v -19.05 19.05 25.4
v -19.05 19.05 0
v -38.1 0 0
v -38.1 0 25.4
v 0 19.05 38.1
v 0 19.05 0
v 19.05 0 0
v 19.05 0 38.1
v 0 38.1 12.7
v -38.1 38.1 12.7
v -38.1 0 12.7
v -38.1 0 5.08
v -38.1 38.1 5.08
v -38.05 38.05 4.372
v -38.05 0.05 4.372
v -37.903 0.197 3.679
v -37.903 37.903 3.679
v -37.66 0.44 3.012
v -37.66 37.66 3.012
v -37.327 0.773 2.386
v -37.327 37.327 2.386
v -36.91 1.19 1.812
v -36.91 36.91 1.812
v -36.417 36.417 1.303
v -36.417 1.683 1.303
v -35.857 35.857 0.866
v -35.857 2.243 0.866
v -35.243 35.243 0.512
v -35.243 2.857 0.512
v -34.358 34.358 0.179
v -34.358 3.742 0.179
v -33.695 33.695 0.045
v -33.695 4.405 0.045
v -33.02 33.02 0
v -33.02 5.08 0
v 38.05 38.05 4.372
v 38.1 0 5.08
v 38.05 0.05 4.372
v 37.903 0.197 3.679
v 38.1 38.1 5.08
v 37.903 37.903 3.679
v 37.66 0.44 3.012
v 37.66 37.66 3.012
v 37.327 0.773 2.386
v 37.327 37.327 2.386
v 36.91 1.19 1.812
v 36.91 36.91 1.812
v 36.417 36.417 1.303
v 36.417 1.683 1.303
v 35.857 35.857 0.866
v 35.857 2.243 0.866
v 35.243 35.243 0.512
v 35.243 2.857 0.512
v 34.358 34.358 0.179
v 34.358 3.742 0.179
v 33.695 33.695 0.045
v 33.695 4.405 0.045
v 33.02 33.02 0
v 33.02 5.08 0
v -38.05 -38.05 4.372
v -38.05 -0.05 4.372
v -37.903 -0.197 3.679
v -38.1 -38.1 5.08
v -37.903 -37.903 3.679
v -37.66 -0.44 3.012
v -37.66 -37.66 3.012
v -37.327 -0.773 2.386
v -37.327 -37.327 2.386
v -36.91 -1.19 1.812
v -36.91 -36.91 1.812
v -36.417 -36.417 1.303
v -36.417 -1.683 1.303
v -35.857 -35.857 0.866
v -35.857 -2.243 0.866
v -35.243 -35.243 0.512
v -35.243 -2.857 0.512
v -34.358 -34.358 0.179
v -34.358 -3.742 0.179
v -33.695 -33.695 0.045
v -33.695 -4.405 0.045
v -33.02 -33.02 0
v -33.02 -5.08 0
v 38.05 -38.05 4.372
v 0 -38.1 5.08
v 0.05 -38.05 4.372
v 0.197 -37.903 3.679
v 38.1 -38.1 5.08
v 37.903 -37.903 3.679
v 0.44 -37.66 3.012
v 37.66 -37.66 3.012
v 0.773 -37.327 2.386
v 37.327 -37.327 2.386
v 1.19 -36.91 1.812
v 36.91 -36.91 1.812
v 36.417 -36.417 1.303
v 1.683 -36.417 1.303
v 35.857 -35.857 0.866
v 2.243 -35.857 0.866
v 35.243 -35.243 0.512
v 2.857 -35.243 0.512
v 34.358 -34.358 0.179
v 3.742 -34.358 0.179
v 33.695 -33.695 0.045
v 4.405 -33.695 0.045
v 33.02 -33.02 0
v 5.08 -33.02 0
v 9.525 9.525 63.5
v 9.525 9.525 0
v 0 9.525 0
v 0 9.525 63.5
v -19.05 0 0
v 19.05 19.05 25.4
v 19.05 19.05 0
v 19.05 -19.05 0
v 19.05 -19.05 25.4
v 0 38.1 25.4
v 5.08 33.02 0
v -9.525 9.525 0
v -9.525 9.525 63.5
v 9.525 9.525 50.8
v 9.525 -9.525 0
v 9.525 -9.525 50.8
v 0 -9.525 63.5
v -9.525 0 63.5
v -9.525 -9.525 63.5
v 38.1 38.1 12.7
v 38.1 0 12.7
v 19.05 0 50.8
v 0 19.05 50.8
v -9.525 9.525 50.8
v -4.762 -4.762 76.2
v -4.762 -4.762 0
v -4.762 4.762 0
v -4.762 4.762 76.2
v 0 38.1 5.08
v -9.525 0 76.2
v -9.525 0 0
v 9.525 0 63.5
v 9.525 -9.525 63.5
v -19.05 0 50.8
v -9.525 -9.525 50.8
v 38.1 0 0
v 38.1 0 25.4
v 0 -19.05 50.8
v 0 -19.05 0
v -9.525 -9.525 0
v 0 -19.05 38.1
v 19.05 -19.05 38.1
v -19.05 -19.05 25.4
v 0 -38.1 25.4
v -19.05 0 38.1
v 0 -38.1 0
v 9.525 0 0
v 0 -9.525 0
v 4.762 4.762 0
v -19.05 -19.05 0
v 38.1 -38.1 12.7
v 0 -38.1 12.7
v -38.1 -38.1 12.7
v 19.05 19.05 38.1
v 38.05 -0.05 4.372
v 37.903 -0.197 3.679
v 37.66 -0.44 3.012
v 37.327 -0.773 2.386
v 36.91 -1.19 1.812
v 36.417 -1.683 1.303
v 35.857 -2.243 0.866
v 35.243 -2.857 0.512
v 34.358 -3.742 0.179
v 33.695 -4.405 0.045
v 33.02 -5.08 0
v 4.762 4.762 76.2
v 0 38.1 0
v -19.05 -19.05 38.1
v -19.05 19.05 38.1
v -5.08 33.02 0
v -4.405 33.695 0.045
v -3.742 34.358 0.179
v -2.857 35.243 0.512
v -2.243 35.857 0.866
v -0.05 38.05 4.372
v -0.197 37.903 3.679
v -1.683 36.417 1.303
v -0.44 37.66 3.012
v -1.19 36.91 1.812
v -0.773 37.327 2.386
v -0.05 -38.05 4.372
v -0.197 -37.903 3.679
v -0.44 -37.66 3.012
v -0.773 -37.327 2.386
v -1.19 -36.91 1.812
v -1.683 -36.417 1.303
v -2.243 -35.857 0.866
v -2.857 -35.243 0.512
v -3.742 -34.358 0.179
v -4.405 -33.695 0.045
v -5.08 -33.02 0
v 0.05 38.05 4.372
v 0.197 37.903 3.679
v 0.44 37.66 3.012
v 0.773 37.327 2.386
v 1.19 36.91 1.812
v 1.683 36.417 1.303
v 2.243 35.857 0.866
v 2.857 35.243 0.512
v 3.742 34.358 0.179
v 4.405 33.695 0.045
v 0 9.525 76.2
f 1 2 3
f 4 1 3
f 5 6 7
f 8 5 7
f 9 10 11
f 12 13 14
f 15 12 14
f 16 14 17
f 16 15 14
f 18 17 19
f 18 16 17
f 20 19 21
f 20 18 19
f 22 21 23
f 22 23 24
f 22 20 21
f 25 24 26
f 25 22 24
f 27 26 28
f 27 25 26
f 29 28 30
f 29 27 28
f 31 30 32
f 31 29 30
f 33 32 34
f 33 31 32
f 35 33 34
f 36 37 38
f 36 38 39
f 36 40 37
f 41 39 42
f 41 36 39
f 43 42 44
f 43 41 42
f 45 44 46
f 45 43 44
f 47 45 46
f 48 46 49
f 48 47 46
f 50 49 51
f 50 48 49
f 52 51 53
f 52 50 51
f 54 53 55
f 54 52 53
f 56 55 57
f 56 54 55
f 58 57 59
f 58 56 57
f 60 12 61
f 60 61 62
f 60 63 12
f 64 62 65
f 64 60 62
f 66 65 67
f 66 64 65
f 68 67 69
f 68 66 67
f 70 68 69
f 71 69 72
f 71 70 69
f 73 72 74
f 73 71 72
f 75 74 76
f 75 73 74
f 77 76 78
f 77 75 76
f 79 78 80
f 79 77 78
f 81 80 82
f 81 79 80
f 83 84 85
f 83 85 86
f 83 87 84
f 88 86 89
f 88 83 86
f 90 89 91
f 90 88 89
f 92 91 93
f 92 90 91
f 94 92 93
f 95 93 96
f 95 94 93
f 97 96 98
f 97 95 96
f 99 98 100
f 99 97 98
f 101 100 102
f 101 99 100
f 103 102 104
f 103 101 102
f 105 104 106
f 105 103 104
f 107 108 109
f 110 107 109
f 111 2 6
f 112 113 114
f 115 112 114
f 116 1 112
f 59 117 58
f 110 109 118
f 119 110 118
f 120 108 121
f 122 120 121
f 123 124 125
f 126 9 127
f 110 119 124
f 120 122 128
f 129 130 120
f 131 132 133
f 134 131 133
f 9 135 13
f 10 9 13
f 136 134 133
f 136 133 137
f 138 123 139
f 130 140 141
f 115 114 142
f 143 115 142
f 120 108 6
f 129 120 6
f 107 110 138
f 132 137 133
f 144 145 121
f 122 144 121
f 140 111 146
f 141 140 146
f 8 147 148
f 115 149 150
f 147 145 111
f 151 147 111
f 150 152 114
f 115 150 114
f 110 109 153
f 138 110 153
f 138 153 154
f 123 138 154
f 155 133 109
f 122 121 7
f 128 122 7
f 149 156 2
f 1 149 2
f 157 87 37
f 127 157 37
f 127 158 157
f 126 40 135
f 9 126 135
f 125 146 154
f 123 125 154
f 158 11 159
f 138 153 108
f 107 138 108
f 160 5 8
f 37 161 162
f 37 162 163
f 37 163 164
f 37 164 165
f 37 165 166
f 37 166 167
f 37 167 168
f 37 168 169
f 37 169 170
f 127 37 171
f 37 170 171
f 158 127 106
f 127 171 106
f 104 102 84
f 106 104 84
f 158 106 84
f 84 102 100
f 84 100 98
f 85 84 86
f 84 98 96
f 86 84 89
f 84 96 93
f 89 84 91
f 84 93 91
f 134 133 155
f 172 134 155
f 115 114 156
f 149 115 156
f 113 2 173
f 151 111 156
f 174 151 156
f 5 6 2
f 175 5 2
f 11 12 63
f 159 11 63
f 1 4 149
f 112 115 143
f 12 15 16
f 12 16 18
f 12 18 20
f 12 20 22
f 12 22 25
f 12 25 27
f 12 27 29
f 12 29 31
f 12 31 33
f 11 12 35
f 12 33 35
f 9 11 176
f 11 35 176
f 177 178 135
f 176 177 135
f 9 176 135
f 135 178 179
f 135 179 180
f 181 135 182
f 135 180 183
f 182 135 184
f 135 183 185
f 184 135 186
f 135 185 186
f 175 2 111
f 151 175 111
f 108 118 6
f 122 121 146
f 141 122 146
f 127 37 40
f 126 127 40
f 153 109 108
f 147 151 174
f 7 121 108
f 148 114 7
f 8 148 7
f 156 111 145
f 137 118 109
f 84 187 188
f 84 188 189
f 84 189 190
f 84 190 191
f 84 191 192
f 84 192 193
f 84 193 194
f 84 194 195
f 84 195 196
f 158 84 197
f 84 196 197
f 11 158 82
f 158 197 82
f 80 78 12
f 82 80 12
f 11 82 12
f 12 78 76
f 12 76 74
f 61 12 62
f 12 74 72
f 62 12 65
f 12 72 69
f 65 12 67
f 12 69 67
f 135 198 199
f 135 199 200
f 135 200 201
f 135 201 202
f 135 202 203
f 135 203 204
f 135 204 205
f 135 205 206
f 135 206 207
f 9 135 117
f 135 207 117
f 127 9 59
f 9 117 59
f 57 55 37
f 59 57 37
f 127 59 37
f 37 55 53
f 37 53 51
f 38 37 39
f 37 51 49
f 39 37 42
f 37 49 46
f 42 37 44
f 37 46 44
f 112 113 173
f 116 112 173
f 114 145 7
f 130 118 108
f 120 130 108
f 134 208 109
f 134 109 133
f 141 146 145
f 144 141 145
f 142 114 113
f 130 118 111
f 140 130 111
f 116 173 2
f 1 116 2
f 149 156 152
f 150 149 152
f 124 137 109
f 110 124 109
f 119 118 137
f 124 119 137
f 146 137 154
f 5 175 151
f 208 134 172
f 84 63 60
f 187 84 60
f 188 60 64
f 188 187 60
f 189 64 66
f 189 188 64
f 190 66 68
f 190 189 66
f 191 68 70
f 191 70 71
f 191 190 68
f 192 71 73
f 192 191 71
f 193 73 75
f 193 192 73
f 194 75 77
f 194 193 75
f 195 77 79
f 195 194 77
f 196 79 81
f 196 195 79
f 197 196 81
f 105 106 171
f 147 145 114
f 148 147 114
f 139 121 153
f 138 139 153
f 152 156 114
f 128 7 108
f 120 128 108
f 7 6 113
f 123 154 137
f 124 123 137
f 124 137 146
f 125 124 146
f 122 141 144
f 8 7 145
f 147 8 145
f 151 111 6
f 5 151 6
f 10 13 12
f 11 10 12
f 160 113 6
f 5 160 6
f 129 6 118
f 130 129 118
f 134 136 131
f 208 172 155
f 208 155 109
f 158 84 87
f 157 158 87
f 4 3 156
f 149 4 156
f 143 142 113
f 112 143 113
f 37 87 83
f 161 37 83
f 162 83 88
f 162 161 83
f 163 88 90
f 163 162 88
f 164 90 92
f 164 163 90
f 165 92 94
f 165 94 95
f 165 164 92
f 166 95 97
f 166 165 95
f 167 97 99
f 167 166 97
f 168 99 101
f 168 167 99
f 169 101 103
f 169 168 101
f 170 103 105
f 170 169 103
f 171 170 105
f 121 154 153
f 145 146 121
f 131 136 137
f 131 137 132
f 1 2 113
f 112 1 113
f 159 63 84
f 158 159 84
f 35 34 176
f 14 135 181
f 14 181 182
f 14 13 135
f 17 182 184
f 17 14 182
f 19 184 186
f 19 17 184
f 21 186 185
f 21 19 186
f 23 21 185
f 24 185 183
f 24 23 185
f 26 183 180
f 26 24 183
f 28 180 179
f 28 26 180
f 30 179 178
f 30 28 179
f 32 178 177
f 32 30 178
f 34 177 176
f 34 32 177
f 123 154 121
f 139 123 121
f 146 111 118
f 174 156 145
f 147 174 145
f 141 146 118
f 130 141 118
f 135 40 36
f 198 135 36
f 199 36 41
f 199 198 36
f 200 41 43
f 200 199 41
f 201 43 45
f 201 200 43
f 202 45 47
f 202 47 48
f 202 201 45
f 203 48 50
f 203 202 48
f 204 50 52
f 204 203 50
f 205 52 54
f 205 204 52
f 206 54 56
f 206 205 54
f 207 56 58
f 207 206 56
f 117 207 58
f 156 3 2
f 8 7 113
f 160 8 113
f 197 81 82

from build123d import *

# Parameters (mm, degrees)
F1_DEPTH = 12.7
F2_DEPTH = 25.4
F3_DEPTH = 38.1
F4_DEPTH = 50.8
F5_DEPTH = 63.5
F6_DEPTH = 76.2
F7_R     = 5.08
F7_2_R   = 5.08
F7_3_R   = 5.08
F7_4_R   = 5.08


with BuildPart() as f1:
    # F0 (on Top) → F1 (new body)
    with BuildSketch(Plane.XY):
        Polygon((0, 38.1), (-38.1, 38.1), (-38.1, 0), (-19.05, 19.05), align=None)
    extrude(amount=F1_DEPTH)

    # F7#4
    f7_4_edges = [f1.edges().sort_by_distance(p)[0] for p in [
        (-19.05, 38.1, 0),
        (-38.1, 19.05, 0),
    ]]
    fillet(f7_4_edges, radius=F7_4_R)


with BuildPart() as f1b:
    # F0 (on Top) → F1, piece 2 (new body)
    with BuildSketch(Plane.XY):
        Polygon((38.1, 38.1), (0, 38.1), (19.05, 19.05), (38.1, 0), align=None)
    extrude(amount=F1_DEPTH)

    # F7#3
    f7_3_edges = [f1b.edges().sort_by_distance(p)[0] for p in [
        (38.1, 19.05, 0),
        (19.05, 38.1, 0),
    ]]
    fillet(f7_3_edges, radius=F7_3_R)


with BuildPart() as f1c:
    # F0 (on Top) → F1, piece 3 (new body)
    with BuildSketch(Plane.XY):
        Polygon((19.05, -19.05), (0, -38.1), (38.1, -38.1), (38.1, 0), align=None)
    extrude(amount=F1_DEPTH)

    # F7#2
    f7_2_edges = [f1c.edges().sort_by_distance(p)[0] for p in [
        (19.05, -38.1, 0),
        (38.1, -19.05, 0),
    ]]
    fillet(f7_2_edges, radius=F7_2_R)


with BuildPart() as f1d:
    # F0 (on Top) → F1, piece 4 (new body)
    with BuildSketch(Plane.XY):
        Polygon((-19.05, -19.05), (-38.1, 0), (-38.1, -38.1), (0, -38.1), align=None)
    extrude(amount=F1_DEPTH)

    # F7
    f7_edges = [f1d.edges().sort_by_distance(p)[0] for p in [
        (-19.05, -38.1, 0),
        (-38.1, -19.05, 0),
    ]]
    fillet(f7_edges, radius=F7_R)


with BuildPart() as f2:
    # F0 (on Top) → F2 (new body)
    with BuildSketch(Plane.XY):
        Polygon((-19.05, 19.05), (-38.1, 0), (-19.05, -19.05), (-19.05, 0), align=None)
    extrude(amount=F2_DEPTH)


with BuildPart() as f2b:
    # F0 (on Top) → F2, piece 2 (new body)
    with BuildSketch(Plane.XY):
        Polygon((19.05, 19.05), (0, 38.1), (-19.05, 19.05), (0, 19.05), align=None)
    extrude(amount=F2_DEPTH)


with BuildPart() as f2c:
    # F0 (on Top) → F2, piece 3 (new body)
    with BuildSketch(Plane.XY):
        Polygon((38.1, 0), (19.05, 19.05), (19.05, 0), (19.05, -19.05), align=None)
    extrude(amount=F2_DEPTH)


with BuildPart() as f2d:
    # F0 (on Top) → F2, piece 4 (new body)
    with BuildSketch(Plane.XY):
        Polygon((0, -19.05), (-19.05, -19.05), (0, -38.1), (19.05, -19.05), align=None)
    extrude(amount=F2_DEPTH)


with BuildPart() as f3:
    # F0 (on Top) → F3 (new body)
    with BuildSketch(Plane.XY):
        Polygon((0, 19.05), (-19.05, 19.05), (-19.05, 0), (-9.525, 9.525), align=None)
    extrude(amount=F3_DEPTH)


with BuildPart() as f3b:
    # F0 (on Top) → F3, piece 2 (new body)
    with BuildSketch(Plane.XY):
        Polygon((-19.05, 0), (-19.05, -19.05), (0, -19.05), (-9.525, -9.525), align=None)
    extrude(amount=F3_DEPTH)


with BuildPart() as f3c:
    # F0 (on Top) → F3, piece 3 (new body)
    with BuildSketch(Plane.XY):
        Polygon((9.525, -9.525), (0, -19.05), (19.05, -19.05), (19.05, 0), align=None)
    extrude(amount=F3_DEPTH)


with BuildPart() as f3d:
    # F0 (on Top) → F3, piece 4 (new body)
    with BuildSketch(Plane.XY):
        Polygon((19.05, 0), (19.05, 19.05), (0, 19.05), (9.525, 9.525), align=None)
    extrude(amount=F3_DEPTH)


with BuildPart() as f4:
    # F0 (on Top) → F4 (new body)
    with BuildSketch(Plane.XY):
        Polygon((-9.525, 9.525), (-19.05, 0), (-9.525, -9.525), (-9.525, 0), align=None)
    extrude(amount=F4_DEPTH)


with BuildPart() as f4b:
    # F0 (on Top) → F4, piece 2 (new body)
    with BuildSketch(Plane.XY):
        Polygon((-9.525, -9.525), (0, -19.05), (9.525, -9.525), (0, -9.525), align=None)
    extrude(amount=F4_DEPTH)


with BuildPart() as f4c:
    # F0 (on Top) → F4, piece 3 (new body)
    with BuildSketch(Plane.XY):
        Polygon((9.525, -9.525), (19.05, 0), (9.525, 9.525), (9.525, 0), align=None)
    extrude(amount=F4_DEPTH)


with BuildPart() as f4d:
    # F0 (on Top) → F4, piece 4 (new body)
    with BuildSketch(Plane.XY):
        Polygon((9.525, 9.525), (0, 19.05), (-9.525, 9.525), (0, 9.525), align=None)
    extrude(amount=F4_DEPTH)


with BuildPart() as f5:
    # F0 (on Top) → F5 (new body)
    with BuildSketch(Plane.XY):
        Polygon((0, 9.525), (-9.525, 9.525), (-9.525, 0), (-4.7625, 4.7625), align=None)
    extrude(amount=F5_DEPTH)


with BuildPart() as f5b:
    # F0 (on Top) → F5, piece 2 (new body)
    with BuildSketch(Plane.XY):
        Polygon((0, -9.525), (9.525, -9.525), (9.525, 0), (4.7625, -4.7625), align=None)
    extrude(amount=F5_DEPTH)


with BuildPart() as f5c:
    # F0 (on Top) → F5, piece 3 (new body)
    with BuildSketch(Plane.XY):
        Polygon((9.525, 0), (9.525, 9.525), (0, 9.525), (4.7625, 4.7625), align=None)
    extrude(amount=F5_DEPTH)


with BuildPart() as f5d:
    # F0 (on Top) → F5, piece 4 (new body)
    with BuildSketch(Plane.XY):
        Polygon((-9.525, 0), (-9.525, -9.525), (0, -9.525), (-4.7625, -4.7625), align=None)
    extrude(amount=F5_DEPTH)


with BuildPart() as f6:
    # F0 (on Top) → F6 (new body)
    with BuildSketch(Plane.XY):
        Polygon((4.7625, 4.7625), (0, 9.525), (-4.7625, 4.7625), align=None)
    extrude(amount=F6_DEPTH)


with BuildPart() as f6b:
    # F0 (on Top) → F6, piece 2 (new body)
    with BuildSketch(Plane.XY):
        Polygon((-4.7625, 4.7625), (-9.525, 0), (-4.7625, -4.7625), align=None)
    extrude(amount=F6_DEPTH)


solid = Compound([f1.part, f1b.part, f1c.part, f1d.part, f2.part, f2b.part, f2c.part, f2d.part, f3.part, f3b.part, f3c.part, f3d.part, f4.part, f4b.part, f4c.part, f4d.part, f5.part, f5b.part, f5c.part, f5d.part, f6.part, f6b.part])
